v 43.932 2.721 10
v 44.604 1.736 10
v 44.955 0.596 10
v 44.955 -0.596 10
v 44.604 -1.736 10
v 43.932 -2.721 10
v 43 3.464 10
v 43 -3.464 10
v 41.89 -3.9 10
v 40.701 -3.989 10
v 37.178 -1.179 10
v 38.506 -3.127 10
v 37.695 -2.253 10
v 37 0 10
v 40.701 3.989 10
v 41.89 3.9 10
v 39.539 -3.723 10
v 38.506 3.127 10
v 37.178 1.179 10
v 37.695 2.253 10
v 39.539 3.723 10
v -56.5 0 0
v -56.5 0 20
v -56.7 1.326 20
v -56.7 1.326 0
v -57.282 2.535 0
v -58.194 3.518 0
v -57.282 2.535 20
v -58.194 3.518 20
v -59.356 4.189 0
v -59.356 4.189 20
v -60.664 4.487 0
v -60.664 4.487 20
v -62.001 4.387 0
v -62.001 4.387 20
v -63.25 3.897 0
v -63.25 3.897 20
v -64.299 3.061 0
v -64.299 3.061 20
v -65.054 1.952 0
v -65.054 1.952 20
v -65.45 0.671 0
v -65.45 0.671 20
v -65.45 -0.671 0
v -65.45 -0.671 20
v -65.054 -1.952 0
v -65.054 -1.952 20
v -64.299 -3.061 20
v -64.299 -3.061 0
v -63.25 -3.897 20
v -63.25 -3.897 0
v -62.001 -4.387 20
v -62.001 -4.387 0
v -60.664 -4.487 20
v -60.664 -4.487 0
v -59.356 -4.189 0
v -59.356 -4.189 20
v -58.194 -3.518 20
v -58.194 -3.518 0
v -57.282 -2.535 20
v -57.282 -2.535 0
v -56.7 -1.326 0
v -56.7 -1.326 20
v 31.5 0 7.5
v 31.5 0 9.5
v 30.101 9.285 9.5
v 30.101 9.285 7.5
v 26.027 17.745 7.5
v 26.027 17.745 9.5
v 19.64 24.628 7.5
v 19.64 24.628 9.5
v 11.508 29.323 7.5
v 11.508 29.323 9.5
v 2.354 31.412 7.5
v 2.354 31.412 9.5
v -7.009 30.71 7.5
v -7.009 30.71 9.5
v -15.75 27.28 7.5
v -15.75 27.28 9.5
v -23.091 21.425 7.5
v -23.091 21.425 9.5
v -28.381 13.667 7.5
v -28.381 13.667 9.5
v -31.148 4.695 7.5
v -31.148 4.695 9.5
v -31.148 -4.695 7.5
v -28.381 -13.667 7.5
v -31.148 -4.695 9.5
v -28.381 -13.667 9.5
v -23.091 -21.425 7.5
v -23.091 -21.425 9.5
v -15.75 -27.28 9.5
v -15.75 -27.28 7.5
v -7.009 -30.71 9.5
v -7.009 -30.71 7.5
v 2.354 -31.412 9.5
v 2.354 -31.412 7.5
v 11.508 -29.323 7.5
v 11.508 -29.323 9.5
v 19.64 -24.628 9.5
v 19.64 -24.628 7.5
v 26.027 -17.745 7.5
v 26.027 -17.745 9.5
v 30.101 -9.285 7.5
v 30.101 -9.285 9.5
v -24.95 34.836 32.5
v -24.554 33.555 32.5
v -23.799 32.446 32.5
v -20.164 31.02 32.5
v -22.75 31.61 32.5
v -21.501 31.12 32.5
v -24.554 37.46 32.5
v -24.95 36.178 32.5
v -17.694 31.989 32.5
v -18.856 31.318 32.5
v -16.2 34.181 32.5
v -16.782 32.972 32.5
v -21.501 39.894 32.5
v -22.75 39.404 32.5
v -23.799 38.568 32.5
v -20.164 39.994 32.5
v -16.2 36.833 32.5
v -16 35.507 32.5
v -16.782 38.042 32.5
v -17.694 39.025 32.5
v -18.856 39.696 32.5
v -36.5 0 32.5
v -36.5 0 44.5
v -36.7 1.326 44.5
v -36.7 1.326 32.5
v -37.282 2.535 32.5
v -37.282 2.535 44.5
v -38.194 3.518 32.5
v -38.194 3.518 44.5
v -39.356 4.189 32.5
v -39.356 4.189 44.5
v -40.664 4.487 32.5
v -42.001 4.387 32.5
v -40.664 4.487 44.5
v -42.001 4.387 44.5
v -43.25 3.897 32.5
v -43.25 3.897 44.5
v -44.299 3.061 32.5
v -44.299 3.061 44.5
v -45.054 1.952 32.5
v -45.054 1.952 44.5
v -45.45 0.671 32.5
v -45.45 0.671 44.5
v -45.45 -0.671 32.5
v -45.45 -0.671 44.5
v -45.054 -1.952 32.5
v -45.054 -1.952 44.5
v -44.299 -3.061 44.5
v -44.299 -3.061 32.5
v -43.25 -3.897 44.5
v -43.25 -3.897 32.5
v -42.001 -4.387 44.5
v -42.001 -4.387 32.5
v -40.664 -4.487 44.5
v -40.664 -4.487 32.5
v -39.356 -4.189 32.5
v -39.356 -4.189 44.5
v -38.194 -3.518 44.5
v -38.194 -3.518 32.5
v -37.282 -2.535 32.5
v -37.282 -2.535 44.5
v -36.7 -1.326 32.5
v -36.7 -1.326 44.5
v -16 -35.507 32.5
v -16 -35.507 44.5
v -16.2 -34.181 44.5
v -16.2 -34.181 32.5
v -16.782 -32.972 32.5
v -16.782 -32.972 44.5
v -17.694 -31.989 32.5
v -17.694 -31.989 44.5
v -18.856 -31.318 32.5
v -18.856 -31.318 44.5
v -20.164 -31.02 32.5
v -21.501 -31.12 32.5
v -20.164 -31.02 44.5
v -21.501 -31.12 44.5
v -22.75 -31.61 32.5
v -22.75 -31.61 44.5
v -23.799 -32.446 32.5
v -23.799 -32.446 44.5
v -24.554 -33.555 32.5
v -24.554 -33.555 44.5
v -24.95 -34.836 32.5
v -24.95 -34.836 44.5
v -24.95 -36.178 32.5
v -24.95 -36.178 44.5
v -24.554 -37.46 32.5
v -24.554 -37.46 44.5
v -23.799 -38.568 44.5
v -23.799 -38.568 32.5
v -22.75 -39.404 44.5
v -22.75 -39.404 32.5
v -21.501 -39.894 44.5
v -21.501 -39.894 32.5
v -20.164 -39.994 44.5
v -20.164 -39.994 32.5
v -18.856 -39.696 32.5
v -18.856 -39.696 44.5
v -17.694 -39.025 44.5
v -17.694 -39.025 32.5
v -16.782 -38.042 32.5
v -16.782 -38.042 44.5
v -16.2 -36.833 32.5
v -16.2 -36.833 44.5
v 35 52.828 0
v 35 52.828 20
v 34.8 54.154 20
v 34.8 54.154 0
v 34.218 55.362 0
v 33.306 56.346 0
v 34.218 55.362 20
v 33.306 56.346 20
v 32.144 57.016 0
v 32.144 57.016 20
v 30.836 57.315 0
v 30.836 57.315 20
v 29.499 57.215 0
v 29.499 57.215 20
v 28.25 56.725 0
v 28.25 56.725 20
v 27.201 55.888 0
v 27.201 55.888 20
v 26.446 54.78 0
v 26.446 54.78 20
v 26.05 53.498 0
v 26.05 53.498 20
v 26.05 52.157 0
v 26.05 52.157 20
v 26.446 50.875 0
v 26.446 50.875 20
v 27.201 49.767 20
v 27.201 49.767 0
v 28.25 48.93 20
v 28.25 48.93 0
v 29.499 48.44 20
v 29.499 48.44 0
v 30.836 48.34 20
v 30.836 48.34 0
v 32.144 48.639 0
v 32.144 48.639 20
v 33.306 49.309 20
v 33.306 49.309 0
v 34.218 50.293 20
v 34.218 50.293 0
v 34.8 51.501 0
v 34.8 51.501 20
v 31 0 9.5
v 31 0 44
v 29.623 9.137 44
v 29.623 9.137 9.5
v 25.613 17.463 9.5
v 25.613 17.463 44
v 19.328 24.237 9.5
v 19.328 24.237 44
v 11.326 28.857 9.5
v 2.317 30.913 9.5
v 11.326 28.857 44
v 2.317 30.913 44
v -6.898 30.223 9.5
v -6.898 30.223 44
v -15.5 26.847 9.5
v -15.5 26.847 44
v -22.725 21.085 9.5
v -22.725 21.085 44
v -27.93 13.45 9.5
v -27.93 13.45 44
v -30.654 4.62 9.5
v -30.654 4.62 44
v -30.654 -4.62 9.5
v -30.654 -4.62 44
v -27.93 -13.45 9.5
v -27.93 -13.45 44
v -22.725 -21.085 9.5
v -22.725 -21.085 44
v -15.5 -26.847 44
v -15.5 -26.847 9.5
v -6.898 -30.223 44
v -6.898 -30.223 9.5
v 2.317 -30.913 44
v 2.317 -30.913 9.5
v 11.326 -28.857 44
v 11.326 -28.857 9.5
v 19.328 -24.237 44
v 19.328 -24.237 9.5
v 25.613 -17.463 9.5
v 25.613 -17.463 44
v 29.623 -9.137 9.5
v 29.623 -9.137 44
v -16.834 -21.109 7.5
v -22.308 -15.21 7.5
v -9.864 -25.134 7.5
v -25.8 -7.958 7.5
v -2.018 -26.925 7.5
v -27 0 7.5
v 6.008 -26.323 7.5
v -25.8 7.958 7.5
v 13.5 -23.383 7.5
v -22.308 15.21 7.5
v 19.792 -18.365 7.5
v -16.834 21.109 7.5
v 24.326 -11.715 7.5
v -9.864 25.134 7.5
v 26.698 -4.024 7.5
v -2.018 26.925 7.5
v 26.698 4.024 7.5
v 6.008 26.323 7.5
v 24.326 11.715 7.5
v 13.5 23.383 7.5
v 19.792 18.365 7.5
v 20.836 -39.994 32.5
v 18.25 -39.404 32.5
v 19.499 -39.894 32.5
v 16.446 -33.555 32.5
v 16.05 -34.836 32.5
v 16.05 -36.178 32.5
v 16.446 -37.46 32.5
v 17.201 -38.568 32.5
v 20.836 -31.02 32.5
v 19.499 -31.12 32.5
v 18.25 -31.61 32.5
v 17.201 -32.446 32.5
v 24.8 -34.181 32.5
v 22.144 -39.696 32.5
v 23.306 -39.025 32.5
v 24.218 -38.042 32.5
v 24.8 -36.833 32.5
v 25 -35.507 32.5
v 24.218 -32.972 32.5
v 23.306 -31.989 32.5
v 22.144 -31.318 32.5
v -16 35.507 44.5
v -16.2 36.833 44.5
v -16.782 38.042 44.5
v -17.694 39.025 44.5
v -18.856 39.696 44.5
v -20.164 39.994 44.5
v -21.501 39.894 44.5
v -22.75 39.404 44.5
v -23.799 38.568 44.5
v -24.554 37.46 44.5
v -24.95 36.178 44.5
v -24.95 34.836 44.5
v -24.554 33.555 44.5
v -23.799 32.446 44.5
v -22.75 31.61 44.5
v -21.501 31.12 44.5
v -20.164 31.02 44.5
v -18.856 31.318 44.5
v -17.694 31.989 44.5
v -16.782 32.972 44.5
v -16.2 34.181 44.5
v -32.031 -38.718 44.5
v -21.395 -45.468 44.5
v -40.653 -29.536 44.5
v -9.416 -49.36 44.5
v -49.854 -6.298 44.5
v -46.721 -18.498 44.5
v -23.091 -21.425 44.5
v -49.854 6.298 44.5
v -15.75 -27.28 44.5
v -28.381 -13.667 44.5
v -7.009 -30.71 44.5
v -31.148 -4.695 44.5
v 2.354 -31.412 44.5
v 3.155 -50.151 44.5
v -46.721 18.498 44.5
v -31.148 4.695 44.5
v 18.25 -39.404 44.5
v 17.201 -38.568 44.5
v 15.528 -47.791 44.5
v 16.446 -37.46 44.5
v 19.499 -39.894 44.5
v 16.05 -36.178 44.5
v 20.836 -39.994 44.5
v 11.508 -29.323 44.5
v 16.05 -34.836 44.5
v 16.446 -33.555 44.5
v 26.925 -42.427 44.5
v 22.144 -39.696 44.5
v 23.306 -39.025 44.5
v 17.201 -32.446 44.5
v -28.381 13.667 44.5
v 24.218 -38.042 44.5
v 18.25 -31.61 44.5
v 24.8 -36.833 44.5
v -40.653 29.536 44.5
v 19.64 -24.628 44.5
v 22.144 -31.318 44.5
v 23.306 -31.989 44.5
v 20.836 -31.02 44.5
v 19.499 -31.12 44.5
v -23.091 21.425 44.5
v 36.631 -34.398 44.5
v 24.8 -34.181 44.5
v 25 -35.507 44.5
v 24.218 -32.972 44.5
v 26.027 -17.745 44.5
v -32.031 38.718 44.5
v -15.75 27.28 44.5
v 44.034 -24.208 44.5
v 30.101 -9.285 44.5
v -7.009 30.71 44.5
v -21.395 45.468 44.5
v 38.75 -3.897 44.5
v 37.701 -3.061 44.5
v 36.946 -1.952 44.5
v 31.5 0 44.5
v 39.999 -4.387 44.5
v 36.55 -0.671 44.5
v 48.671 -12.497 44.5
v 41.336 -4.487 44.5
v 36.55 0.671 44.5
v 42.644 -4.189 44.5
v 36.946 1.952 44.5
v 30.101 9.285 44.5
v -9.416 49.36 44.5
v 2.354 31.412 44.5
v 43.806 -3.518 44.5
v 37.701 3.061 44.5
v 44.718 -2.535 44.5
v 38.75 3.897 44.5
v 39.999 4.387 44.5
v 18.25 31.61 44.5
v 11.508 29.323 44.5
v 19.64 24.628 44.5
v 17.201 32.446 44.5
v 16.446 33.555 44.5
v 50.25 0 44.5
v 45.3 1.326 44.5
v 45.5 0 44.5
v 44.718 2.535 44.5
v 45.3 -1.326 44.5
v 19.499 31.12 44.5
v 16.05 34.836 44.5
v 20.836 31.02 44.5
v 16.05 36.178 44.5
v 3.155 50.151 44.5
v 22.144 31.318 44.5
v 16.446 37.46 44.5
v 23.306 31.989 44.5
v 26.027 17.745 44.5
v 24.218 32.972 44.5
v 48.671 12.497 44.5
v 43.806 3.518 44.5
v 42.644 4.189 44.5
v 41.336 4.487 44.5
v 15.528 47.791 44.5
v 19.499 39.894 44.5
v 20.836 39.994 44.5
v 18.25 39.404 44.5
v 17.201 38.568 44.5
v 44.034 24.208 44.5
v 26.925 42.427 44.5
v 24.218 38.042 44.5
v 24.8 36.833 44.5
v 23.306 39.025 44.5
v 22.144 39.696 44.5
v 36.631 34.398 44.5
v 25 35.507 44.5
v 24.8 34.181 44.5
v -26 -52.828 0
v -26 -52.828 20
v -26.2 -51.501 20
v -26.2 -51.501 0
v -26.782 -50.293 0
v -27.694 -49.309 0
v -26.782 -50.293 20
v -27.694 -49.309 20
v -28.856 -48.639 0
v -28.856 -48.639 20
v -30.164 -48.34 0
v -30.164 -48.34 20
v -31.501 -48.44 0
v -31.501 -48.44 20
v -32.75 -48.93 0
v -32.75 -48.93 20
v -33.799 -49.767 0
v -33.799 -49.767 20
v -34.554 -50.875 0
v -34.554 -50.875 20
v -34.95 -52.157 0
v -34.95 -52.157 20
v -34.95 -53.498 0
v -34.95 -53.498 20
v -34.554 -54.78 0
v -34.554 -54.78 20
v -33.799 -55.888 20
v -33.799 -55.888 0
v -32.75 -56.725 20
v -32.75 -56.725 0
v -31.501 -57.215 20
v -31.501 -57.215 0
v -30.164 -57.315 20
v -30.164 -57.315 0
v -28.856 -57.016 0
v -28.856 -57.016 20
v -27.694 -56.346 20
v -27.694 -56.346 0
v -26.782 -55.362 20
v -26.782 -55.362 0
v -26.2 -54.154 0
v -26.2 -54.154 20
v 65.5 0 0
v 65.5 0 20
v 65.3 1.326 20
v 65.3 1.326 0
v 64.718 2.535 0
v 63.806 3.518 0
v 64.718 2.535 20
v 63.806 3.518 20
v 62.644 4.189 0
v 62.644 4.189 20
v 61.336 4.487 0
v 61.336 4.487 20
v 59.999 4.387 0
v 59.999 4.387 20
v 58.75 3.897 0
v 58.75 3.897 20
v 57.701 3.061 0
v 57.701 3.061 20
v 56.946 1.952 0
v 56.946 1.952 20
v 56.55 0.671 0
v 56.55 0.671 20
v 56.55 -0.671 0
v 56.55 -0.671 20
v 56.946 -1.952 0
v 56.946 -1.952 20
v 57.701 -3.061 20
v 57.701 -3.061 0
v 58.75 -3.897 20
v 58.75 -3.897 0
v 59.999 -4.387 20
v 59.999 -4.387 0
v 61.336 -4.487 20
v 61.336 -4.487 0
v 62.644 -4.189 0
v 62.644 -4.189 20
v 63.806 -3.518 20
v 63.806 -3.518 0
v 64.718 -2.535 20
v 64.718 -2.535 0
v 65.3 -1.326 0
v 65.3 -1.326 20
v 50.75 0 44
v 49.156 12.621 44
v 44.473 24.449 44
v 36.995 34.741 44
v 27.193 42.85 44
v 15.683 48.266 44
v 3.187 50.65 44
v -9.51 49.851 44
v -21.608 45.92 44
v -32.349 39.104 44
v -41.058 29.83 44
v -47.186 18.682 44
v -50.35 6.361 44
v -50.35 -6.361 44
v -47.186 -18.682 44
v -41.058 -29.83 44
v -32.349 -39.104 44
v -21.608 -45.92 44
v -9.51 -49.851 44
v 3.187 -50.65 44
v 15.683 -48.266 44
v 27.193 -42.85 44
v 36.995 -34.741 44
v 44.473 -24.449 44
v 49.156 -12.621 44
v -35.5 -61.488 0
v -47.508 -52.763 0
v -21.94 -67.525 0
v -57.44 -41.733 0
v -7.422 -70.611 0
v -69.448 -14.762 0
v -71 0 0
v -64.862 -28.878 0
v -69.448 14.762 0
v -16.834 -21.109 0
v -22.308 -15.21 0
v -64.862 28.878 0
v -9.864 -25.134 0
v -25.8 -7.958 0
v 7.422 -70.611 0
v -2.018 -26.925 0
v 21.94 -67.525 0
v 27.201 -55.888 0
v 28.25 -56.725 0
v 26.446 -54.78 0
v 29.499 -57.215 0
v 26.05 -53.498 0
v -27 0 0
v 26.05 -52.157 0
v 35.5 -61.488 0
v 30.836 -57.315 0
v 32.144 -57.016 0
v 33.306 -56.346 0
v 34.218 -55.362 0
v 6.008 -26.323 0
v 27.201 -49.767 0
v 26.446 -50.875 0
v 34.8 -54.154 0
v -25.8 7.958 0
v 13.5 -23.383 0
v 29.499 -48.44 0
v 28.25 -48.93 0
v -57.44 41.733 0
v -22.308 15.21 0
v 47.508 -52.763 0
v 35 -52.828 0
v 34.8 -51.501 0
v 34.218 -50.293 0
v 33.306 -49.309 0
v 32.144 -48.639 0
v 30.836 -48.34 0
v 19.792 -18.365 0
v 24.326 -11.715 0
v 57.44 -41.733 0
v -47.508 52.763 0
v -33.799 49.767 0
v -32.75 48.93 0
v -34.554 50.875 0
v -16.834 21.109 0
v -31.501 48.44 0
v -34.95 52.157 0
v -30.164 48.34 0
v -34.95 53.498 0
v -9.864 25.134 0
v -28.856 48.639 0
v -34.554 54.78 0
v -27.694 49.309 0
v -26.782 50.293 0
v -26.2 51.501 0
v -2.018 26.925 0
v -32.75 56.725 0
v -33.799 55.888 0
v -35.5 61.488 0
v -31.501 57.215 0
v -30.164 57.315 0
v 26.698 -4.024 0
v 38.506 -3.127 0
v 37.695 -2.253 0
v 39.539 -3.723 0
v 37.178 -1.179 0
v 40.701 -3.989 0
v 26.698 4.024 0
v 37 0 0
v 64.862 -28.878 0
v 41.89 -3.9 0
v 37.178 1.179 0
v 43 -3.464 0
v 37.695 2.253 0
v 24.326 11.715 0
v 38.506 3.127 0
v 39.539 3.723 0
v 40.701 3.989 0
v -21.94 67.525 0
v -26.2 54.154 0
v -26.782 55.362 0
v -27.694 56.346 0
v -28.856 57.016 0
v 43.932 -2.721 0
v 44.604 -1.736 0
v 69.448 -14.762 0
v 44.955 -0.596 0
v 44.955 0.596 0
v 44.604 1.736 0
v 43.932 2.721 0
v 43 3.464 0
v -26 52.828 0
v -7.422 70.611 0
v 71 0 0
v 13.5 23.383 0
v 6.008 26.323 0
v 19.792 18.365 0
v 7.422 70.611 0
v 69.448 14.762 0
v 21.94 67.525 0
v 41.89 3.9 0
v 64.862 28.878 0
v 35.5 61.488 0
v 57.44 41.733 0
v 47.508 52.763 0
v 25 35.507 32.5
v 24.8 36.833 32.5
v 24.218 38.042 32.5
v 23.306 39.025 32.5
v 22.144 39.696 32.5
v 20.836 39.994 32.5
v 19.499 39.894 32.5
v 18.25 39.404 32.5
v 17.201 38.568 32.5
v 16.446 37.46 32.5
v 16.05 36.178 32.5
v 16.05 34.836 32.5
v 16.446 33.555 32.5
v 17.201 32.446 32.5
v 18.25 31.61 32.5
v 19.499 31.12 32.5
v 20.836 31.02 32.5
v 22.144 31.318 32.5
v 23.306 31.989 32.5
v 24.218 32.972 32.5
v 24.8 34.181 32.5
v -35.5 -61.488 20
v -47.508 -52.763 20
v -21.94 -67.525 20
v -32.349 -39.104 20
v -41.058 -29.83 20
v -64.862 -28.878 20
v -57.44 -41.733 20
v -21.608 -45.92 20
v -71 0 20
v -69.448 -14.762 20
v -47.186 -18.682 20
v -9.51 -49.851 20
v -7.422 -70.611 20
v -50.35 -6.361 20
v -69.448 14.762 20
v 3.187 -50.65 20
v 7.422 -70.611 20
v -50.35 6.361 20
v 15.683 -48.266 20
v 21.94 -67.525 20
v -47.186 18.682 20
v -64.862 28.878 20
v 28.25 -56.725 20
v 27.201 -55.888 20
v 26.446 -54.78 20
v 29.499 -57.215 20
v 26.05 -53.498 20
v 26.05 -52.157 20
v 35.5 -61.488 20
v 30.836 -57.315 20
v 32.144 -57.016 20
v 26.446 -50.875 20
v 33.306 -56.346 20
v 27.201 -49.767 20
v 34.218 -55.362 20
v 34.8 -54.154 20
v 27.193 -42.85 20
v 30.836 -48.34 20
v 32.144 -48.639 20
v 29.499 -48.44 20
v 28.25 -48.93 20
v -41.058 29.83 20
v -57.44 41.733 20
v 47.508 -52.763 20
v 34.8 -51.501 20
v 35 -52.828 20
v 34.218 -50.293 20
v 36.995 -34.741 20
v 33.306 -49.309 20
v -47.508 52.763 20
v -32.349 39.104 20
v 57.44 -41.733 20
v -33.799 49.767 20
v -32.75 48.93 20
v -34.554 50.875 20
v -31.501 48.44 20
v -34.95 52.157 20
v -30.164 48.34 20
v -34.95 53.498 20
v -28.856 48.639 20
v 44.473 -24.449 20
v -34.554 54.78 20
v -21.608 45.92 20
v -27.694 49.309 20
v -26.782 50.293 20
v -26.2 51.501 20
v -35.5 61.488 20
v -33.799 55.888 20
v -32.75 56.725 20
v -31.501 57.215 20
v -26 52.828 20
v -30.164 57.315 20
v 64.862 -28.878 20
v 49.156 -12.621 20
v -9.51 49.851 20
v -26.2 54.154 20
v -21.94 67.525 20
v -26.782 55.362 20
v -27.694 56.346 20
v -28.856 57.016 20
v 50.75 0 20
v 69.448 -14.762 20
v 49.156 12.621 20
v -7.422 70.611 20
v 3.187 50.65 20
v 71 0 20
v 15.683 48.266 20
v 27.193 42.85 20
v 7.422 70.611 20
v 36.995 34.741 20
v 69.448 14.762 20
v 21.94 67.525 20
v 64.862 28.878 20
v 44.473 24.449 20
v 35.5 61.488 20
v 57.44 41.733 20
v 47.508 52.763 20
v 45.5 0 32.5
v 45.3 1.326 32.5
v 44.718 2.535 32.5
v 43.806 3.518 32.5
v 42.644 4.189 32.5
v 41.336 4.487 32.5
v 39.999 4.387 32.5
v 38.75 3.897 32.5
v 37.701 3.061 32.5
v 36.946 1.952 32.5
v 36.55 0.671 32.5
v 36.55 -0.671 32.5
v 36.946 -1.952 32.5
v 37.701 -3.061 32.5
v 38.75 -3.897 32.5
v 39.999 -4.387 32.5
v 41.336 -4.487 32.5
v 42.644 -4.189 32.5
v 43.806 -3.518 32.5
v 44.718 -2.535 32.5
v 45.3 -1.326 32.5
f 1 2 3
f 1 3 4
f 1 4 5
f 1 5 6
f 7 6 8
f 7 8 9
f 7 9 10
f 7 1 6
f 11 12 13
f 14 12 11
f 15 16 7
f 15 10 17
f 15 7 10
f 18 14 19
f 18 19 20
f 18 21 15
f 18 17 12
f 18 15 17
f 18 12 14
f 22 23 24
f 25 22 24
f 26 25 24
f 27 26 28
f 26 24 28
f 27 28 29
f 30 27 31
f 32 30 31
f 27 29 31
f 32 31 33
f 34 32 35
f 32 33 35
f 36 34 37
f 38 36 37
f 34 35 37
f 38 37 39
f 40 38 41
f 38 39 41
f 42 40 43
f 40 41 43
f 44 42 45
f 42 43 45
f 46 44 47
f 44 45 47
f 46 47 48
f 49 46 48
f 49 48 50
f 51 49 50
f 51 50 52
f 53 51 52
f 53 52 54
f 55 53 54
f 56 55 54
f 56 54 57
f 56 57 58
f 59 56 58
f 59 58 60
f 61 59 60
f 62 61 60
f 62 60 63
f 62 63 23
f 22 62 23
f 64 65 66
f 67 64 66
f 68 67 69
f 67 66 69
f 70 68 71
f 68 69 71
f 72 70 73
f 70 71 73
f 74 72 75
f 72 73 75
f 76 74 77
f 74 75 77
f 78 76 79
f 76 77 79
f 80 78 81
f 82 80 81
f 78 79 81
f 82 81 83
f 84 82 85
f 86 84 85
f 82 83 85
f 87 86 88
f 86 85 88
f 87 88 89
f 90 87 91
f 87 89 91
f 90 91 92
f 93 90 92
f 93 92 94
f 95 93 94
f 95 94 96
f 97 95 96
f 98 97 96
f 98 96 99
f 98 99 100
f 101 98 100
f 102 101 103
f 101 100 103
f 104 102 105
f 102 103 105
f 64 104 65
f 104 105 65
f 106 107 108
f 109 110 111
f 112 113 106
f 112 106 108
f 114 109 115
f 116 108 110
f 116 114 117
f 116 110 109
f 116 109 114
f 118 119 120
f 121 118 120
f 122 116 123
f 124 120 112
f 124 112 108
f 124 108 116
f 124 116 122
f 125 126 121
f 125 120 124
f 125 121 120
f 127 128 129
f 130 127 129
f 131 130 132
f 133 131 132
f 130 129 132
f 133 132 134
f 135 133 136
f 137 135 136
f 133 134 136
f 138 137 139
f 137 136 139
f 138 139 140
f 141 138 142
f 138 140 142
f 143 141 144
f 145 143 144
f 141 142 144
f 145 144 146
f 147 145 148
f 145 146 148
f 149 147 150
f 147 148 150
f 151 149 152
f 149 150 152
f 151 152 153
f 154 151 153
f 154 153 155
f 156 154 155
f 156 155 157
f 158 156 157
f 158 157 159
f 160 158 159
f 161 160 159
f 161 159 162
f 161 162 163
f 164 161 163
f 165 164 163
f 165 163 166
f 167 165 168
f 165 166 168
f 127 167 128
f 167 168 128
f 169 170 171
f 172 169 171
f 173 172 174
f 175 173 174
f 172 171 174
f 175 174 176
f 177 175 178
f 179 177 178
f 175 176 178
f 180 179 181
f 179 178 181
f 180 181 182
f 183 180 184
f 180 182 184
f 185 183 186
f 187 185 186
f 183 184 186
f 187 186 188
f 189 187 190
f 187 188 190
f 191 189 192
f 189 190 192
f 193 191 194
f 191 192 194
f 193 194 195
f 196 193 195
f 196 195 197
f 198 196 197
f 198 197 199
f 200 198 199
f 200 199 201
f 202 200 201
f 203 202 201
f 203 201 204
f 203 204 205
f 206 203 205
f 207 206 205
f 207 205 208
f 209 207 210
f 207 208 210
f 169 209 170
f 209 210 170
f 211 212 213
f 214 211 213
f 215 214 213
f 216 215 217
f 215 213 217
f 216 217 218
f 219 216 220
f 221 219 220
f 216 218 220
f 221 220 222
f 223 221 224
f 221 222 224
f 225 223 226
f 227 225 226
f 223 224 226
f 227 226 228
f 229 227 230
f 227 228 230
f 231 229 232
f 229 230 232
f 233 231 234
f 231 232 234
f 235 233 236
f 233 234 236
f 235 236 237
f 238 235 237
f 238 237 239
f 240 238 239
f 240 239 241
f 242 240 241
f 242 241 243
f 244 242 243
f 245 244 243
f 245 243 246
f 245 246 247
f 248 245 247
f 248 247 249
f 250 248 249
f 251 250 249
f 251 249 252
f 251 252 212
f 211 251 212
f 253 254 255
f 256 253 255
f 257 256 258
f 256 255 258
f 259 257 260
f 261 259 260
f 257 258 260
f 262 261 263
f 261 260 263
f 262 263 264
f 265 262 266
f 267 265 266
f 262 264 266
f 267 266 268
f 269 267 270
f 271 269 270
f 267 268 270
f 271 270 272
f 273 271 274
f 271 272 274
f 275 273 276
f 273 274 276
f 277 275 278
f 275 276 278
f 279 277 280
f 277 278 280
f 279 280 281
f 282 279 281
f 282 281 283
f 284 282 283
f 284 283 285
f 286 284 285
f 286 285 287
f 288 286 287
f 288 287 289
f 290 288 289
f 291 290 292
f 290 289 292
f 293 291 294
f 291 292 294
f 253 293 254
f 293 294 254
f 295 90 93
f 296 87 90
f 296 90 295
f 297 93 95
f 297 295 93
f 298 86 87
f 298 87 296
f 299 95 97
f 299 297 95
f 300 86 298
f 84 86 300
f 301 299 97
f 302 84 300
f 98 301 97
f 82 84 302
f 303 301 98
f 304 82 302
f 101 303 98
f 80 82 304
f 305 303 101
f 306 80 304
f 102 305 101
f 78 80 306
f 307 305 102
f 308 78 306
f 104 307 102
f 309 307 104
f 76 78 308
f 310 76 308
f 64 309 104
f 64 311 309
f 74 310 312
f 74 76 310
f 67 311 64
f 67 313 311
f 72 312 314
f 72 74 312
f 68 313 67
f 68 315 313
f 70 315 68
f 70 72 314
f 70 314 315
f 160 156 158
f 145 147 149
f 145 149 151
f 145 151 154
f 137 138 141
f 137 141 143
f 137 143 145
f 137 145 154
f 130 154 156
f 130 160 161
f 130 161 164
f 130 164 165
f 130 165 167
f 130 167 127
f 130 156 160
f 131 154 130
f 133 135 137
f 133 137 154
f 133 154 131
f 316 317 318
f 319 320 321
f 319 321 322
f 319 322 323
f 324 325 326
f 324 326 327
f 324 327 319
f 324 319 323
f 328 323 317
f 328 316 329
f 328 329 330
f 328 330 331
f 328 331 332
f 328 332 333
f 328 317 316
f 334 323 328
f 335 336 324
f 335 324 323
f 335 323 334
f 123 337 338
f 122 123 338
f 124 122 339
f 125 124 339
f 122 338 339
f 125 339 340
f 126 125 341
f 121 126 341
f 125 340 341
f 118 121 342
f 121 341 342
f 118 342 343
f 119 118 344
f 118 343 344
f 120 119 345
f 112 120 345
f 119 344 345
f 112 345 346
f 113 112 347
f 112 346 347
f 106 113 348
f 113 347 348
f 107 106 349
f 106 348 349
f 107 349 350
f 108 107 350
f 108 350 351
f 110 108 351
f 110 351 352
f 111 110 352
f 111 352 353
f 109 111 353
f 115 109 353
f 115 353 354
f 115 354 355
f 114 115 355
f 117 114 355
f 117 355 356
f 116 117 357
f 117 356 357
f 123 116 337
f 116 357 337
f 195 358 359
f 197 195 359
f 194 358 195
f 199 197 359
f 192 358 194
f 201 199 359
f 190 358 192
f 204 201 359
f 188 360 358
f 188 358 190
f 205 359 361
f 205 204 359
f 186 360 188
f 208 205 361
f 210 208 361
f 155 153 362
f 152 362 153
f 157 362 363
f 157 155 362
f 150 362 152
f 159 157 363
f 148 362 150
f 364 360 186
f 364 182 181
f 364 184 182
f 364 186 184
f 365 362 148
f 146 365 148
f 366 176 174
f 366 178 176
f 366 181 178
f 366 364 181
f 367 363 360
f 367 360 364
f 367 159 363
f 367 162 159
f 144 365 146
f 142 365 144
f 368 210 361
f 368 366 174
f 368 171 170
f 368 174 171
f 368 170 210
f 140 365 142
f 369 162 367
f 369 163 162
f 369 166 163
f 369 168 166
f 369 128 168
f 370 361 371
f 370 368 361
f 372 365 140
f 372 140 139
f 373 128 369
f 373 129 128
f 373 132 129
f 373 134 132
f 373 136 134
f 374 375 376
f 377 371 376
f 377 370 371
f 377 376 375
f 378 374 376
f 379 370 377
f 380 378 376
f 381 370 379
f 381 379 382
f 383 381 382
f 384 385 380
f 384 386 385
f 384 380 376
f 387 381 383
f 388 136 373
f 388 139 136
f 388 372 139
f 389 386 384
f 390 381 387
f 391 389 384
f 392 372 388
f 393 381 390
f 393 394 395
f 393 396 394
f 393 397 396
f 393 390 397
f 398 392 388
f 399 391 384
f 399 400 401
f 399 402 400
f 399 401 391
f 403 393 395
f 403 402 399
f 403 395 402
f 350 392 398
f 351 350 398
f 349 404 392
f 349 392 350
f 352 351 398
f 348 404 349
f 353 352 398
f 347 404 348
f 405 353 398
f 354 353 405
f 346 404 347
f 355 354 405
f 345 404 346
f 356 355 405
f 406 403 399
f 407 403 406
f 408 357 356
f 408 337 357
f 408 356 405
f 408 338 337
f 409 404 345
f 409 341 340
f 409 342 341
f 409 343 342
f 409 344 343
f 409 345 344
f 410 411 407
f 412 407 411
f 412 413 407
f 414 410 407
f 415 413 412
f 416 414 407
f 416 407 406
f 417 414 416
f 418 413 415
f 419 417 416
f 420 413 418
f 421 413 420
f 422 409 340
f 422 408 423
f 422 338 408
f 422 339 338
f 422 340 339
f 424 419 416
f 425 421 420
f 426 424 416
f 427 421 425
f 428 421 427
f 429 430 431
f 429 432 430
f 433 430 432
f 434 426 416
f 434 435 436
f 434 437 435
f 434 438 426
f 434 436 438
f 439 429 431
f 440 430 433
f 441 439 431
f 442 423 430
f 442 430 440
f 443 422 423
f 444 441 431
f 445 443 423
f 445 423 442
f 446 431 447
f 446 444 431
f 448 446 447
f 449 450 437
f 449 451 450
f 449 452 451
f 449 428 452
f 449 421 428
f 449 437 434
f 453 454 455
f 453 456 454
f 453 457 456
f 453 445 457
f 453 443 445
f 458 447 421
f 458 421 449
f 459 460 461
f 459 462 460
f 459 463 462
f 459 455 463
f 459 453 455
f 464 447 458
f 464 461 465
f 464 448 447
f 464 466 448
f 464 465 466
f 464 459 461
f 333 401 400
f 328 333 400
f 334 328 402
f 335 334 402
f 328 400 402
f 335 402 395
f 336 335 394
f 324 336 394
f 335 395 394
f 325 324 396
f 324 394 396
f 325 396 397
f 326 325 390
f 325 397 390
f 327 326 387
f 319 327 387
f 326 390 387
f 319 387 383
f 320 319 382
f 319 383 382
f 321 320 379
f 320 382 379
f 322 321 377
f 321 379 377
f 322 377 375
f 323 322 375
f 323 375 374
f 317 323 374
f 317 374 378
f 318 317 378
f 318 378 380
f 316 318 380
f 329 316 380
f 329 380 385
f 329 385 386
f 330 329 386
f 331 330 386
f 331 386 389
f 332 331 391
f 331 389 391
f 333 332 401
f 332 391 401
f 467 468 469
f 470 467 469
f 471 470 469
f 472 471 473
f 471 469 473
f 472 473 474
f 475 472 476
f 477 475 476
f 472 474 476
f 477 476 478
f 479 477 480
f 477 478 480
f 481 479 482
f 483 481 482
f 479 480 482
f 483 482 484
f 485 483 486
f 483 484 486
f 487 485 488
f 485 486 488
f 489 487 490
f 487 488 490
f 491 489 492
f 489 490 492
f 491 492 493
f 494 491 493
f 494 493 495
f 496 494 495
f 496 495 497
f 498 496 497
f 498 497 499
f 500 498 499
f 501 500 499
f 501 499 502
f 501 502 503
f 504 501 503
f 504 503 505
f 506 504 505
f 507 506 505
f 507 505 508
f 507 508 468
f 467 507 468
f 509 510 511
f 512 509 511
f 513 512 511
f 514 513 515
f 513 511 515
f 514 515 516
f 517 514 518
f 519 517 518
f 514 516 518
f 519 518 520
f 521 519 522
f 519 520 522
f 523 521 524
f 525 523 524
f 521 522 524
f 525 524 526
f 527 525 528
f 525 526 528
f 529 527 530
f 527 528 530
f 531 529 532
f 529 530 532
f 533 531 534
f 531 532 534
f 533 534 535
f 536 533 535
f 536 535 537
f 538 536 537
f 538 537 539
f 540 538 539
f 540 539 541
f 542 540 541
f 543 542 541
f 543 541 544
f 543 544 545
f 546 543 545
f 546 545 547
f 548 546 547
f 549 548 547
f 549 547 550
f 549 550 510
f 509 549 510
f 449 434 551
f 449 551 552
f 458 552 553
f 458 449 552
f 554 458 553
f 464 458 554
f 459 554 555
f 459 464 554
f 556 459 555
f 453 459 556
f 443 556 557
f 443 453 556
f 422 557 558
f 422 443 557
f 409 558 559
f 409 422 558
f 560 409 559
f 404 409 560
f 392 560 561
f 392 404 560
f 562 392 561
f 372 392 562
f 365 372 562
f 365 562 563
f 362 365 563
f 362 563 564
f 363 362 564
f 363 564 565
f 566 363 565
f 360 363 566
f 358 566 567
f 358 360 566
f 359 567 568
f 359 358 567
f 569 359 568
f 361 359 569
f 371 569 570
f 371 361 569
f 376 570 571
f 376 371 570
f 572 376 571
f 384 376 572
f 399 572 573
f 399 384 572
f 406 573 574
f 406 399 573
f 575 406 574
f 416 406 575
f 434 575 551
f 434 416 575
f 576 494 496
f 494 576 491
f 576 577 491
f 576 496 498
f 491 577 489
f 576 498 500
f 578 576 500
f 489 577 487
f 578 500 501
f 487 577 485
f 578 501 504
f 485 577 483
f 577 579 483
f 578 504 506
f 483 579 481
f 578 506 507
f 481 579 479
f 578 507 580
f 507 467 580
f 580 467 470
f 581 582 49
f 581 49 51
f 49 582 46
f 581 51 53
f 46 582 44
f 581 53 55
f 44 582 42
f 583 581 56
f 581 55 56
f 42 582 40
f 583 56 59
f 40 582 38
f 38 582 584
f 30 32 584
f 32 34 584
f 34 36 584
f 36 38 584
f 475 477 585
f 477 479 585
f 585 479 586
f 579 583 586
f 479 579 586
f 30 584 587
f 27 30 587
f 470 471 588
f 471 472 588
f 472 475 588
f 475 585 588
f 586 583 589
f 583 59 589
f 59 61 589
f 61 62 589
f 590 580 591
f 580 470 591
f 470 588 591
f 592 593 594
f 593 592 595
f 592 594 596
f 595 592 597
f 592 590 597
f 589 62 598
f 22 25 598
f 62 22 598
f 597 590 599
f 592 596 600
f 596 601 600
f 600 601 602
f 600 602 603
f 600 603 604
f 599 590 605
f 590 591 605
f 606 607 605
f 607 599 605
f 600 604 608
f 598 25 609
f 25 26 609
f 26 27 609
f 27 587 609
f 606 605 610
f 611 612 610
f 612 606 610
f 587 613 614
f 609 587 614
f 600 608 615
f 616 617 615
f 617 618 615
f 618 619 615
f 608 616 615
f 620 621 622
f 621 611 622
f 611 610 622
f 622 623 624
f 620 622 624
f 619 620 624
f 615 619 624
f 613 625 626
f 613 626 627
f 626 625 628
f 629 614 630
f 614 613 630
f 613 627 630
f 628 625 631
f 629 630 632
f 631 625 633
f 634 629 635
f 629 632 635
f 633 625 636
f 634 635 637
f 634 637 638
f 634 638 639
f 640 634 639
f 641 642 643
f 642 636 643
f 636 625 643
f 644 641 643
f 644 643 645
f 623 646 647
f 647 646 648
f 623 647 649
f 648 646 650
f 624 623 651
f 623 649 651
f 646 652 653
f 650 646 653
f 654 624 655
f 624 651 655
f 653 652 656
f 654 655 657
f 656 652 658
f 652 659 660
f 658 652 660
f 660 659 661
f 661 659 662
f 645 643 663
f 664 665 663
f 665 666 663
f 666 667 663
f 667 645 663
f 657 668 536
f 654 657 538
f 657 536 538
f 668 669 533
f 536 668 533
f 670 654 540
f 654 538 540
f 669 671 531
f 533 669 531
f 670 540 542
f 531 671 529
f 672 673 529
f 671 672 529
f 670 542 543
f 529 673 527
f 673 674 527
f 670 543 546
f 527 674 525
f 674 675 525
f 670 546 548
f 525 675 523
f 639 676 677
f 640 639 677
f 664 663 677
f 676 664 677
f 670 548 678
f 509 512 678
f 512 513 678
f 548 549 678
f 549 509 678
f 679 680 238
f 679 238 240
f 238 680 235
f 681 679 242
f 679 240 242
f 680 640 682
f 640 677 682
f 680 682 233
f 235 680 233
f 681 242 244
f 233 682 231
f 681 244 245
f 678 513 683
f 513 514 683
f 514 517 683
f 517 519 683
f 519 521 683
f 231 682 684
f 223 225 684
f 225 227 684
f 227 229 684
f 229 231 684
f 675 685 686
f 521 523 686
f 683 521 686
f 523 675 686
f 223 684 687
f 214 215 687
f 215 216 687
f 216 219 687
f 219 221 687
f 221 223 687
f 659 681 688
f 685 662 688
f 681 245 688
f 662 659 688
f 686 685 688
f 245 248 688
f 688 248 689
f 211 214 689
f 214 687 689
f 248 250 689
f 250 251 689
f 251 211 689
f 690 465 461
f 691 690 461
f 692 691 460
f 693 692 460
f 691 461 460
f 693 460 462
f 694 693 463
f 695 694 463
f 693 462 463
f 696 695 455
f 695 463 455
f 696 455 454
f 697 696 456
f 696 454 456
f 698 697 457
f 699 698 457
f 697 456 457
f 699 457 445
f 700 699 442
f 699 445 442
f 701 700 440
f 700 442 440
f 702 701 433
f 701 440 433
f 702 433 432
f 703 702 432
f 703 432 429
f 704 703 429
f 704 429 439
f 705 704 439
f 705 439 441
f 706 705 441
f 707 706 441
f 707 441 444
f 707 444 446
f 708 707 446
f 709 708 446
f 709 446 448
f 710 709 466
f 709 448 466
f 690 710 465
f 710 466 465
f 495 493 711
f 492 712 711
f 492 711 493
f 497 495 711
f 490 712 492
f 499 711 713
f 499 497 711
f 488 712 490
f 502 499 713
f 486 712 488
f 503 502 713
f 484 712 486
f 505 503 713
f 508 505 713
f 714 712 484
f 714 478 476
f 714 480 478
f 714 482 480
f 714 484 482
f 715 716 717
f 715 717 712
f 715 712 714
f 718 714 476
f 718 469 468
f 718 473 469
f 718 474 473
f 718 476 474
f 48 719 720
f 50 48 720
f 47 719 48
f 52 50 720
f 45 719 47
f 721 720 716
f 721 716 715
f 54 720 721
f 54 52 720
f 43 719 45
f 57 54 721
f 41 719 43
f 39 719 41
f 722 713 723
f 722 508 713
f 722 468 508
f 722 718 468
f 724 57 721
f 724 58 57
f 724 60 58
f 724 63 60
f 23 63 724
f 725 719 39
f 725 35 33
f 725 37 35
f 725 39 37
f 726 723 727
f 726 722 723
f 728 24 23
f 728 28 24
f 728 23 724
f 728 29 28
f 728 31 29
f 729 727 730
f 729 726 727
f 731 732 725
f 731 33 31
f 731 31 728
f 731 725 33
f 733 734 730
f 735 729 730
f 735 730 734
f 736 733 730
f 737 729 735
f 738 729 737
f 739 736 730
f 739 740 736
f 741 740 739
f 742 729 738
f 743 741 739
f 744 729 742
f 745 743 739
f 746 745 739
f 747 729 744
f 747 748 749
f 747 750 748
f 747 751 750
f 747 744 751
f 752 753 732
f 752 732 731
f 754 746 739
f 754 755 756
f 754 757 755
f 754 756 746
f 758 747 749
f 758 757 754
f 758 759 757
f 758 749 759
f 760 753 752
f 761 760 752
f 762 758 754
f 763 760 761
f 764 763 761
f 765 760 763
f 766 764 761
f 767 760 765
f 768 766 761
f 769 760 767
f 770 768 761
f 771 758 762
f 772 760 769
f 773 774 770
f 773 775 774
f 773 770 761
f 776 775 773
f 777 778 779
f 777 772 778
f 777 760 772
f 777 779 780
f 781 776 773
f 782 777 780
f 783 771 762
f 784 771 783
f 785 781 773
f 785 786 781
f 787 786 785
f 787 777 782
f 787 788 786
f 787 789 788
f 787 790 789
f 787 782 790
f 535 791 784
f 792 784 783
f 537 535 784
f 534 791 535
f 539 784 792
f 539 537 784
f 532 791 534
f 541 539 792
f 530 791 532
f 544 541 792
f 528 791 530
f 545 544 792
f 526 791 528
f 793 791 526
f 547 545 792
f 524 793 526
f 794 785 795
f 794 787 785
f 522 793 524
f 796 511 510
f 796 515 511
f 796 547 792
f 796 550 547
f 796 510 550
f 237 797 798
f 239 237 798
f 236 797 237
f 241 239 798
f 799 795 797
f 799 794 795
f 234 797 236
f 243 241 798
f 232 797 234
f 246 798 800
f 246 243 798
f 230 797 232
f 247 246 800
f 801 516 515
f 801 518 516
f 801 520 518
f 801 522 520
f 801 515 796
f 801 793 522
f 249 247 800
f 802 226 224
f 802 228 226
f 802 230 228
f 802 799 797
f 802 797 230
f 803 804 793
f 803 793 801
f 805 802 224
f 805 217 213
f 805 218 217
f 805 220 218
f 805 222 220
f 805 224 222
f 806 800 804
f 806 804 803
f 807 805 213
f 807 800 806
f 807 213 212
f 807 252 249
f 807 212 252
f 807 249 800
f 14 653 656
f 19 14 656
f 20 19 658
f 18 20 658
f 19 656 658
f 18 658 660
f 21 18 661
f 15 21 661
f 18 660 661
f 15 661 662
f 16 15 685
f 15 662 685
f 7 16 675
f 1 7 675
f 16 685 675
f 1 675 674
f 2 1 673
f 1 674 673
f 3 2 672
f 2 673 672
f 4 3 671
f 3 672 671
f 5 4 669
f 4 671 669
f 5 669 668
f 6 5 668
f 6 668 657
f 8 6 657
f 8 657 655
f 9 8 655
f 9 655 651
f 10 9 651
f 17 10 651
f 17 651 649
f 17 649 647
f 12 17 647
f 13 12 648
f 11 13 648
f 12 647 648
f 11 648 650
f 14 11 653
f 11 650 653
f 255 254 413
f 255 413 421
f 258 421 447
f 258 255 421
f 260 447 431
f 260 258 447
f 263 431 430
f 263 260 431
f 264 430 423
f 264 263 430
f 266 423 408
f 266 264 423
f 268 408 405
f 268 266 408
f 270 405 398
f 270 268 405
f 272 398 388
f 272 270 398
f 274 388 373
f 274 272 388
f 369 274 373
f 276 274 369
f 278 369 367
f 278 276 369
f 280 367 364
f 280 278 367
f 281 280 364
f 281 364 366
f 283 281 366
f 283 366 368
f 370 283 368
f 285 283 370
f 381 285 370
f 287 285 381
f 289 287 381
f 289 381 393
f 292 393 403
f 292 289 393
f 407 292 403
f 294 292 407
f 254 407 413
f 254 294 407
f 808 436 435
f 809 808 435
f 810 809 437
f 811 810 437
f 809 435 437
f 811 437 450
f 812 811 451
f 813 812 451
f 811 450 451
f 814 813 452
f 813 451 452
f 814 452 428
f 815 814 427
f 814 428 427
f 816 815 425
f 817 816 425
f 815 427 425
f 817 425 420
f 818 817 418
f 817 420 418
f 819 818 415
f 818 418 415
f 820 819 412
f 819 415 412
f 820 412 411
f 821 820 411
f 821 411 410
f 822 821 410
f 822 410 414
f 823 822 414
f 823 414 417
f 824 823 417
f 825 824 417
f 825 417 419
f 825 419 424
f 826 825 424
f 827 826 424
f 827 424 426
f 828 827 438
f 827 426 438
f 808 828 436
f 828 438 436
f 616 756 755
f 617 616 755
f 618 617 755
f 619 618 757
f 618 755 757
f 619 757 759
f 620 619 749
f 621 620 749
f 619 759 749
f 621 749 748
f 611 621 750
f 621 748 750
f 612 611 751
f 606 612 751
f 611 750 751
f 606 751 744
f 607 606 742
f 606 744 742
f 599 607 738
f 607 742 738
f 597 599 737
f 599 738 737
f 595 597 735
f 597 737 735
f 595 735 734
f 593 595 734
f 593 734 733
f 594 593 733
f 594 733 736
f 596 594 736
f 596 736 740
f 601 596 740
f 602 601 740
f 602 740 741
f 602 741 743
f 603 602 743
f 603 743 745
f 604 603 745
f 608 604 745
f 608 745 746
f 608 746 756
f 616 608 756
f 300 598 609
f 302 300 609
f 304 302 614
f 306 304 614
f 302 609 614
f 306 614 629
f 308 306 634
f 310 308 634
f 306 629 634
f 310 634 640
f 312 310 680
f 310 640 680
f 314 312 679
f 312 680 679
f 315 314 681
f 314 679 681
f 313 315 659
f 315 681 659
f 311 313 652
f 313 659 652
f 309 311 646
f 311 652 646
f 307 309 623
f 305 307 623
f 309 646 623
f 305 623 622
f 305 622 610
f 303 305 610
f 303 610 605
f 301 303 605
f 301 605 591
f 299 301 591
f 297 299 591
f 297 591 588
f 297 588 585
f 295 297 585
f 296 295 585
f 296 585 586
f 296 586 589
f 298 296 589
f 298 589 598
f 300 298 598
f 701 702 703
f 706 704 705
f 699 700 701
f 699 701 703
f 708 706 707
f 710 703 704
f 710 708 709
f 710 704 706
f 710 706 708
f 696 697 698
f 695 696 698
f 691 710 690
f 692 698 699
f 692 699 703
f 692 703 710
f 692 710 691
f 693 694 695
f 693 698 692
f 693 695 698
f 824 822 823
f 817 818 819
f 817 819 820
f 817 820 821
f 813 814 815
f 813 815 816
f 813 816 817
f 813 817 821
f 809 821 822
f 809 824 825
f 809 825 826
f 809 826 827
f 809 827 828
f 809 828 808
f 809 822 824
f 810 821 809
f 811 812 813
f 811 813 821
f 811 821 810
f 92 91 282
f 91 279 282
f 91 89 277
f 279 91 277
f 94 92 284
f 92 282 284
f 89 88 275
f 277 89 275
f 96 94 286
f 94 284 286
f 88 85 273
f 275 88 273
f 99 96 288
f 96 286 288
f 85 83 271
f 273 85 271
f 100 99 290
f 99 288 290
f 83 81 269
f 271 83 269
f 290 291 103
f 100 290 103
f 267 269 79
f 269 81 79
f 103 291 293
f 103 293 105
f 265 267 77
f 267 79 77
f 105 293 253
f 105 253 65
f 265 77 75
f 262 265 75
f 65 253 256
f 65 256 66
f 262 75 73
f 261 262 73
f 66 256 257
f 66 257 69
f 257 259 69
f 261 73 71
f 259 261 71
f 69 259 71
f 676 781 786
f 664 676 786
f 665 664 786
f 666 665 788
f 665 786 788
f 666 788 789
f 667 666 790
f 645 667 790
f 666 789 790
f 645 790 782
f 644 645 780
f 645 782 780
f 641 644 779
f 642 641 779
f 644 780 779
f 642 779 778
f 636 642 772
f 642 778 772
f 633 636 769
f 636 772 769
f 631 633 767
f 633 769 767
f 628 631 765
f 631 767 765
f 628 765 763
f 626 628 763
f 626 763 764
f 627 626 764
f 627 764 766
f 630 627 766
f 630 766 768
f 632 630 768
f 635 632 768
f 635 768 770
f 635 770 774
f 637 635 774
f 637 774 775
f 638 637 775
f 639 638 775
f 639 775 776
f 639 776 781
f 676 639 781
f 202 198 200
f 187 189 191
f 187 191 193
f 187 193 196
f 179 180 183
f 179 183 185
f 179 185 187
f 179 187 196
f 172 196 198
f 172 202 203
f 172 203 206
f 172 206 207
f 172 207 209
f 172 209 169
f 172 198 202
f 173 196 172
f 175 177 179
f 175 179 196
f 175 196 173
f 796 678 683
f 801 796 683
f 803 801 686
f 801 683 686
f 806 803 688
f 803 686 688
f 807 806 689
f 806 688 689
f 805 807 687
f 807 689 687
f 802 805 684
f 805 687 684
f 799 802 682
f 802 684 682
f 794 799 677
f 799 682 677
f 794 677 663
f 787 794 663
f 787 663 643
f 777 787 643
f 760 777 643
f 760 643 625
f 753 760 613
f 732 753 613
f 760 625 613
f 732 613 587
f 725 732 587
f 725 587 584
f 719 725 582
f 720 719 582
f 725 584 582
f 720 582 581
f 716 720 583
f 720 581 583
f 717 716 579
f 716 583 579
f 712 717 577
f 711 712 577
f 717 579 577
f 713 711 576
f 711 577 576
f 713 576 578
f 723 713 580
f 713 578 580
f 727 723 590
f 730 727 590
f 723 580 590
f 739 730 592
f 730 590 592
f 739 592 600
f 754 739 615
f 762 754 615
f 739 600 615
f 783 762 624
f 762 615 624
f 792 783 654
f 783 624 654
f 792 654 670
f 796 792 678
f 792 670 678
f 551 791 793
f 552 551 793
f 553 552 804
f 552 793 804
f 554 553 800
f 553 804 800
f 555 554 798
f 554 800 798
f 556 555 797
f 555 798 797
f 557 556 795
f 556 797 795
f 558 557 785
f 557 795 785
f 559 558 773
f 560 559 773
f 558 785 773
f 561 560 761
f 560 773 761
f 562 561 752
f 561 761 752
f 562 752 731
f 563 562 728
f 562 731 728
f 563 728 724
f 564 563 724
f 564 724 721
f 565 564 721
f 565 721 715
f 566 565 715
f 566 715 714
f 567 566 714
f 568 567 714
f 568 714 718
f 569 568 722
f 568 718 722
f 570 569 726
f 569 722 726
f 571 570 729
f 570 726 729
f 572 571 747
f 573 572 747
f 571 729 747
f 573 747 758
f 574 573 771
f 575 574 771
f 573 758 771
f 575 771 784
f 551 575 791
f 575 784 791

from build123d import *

# Parameters (mm, degrees)
SKETCH_1_R          = 71
EXTRUDE_1_DEPTH     = 20
SKETCH_2_R          = 50.75
EXTRUDE_2_DEPTH     = 24.5
SKETCH_4_R          = 31
CUT_EXTRUDE_1_DEPTH = 35
CHAMFER_1_SIZE      = 0.5
SKETCH_5_R          = 27
CUT_EXTRUDE_2_DEPTH = 8
SKETCH_6_R          = 31.5
CUT_EXTRUDE_3_DEPTH = 2
CUT_EXTRUDE_4_REACH = 105.355
SKETCH_7_R          = 4.5
SKETCH_8_R          = 4
CUT_EXTRUDE_5_DEPTH = 10
SKETCH_9_R          = 4.5
CUT_EXTRUDE_6_DEPTH = 12


with BuildPart() as part:
    # 草图1 → 凸台-拉伸1 (new body)
    with BuildSketch(Plane.XY):
        Circle(SKETCH_1_R)
    extrude(amount=EXTRUDE_1_DEPTH)

    # 草图2 → 凸台-拉伸2 (add)
    with BuildSketch(Plane.XY.offset(20)):
        Circle(SKETCH_2_R)
    extrude(amount=EXTRUDE_2_DEPTH)

    # 草图4 → 切除-拉伸1 (cut)
    with BuildSketch(Plane.XY.offset(44.5)):
        Circle(SKETCH_4_R)
    extrude(amount=-CUT_EXTRUDE_1_DEPTH, mode=Mode.SUBTRACT)

    # 倒角1
    chamfer_1_edges = [part.edges().sort_by_distance(p)[0] for p in [
        (-31, 0, 44.5),
        (-50.75, 0, 44.5),
    ]]
    chamfer(chamfer_1_edges, length=CHAMFER_1_SIZE)

    # 草图5 → 切除-拉伸2 (cut)
    with BuildSketch(Plane(origin=(0, 0, 0), x_dir=(-1, 0, 0), z_dir=(0, 0, -1))):
        Circle(SKETCH_5_R)
    extrude(amount=-CUT_EXTRUDE_2_DEPTH, mode=Mode.SUBTRACT)

    # 草图6 → 切除-拉伸3 (cut)
    with BuildSketch(Plane.XY.offset(9.5)):
        Circle(SKETCH_6_R)
    extrude(amount=-CUT_EXTRUDE_3_DEPTH, mode=Mode.SUBTRACT)

    # 草图7 → 切除-拉伸4 (cut, up to next)
    with BuildSketch(Plane.XY.offset(20), mode=Mode.PRIVATE) as cut_extrude_4_sk1:
        with Locations((-61, 0)):
            Circle(SKETCH_7_R)
    cut_extrude_4_tool1 = extrude(cut_extrude_4_sk1.sketch, amount=-CUT_EXTRUDE_4_REACH, mode=Mode.PRIVATE) & part.part
    # 草图7 → 切除-拉伸4 (cut, up to next)
    with BuildSketch(Plane.XY.offset(20), mode=Mode.PRIVATE) as cut_extrude_4_sk2:
        with Locations((-30.5, 52.827549631)):
            Circle(SKETCH_7_R)
    cut_extrude_4_tool2 = extrude(cut_extrude_4_sk2.sketch, amount=-CUT_EXTRUDE_4_REACH, mode=Mode.PRIVATE) & part.part
    # 草图7 → 切除-拉伸4 (cut, up to next)
    with BuildSketch(Plane.XY.offset(20), mode=Mode.PRIVATE) as cut_extrude_4_sk3:
        with Locations((30.5, 52.827549631)):
            Circle(SKETCH_7_R)
    cut_extrude_4_tool3 = extrude(cut_extrude_4_sk3.sketch, amount=-CUT_EXTRUDE_4_REACH, mode=Mode.PRIVATE) & part.part
    # 草图7 → 切除-拉伸4 (cut, up to next)
    with BuildSketch(Plane.XY.offset(20), mode=Mode.PRIVATE) as cut_extrude_4_sk4:
        with Locations((61, 0)):
            Circle(SKETCH_7_R)
    cut_extrude_4_tool4 = extrude(cut_extrude_4_sk4.sketch, amount=-CUT_EXTRUDE_4_REACH, mode=Mode.PRIVATE) & part.part
    # 草图7 → 切除-拉伸4 (cut, up to next)
    with BuildSketch(Plane.XY.offset(20), mode=Mode.PRIVATE) as cut_extrude_4_sk5:
        with Locations((30.5, -52.827549631)):
            Circle(SKETCH_7_R)
    cut_extrude_4_tool5 = extrude(cut_extrude_4_sk5.sketch, amount=-CUT_EXTRUDE_4_REACH, mode=Mode.PRIVATE) & part.part
    # 草图7 → 切除-拉伸4 (cut, up to next)
    with BuildSketch(Plane.XY.offset(20), mode=Mode.PRIVATE) as cut_extrude_4_sk6:
        with Locations((-30.5, -52.827549631)):
            Circle(SKETCH_7_R)
    cut_extrude_4_tool6 = extrude(cut_extrude_4_sk6.sketch, amount=-CUT_EXTRUDE_4_REACH, mode=Mode.PRIVATE) & part.part
    add(cut_extrude_4_tool1.solids().sort_by_distance((-61, 0, 20))[0], mode=Mode.SUBTRACT)
    add(cut_extrude_4_tool2.solids().sort_by_distance((-30.5, 52.82755, 20))[0], mode=Mode.SUBTRACT)
    add(cut_extrude_4_tool3.solids().sort_by_distance((30.5, 52.82755, 20))[0], mode=Mode.SUBTRACT)
    add(cut_extrude_4_tool4.solids().sort_by_distance((61, 0, 20))[0], mode=Mode.SUBTRACT)
    add(cut_extrude_4_tool5.solids().sort_by_distance((30.5, -52.82755, 20))[0], mode=Mode.SUBTRACT)
    add(cut_extrude_4_tool6.solids().sort_by_distance((-30.5, -52.82755, 20))[0], mode=Mode.SUBTRACT)

    # 草图8 → 切除-拉伸5 (cut)
    with BuildSketch(Plane(origin=(0, 0, 0), x_dir=(-1, 0, 0), z_dir=(0, 0, -1))):
        with Locations((-41, 0)):
            Circle(SKETCH_8_R)
    extrude(amount=-CUT_EXTRUDE_5_DEPTH, mode=Mode.SUBTRACT)

    # 草图9 → 切除-拉伸6 (cut)
    with BuildSketch(Plane.XY.offset(44.5)):
        with Locations((41, 0)):
            Circle(SKETCH_9_R)
        with Locations((20.5, -35.507041555)):
            Circle(SKETCH_9_R)
        with Locations((-20.5, -35.507041555)):
            Circle(SKETCH_9_R)
        with Locations((-41, 0)):
            Circle(SKETCH_9_R)
        with Locations((-20.5, 35.507041555)):
            Circle(SKETCH_9_R)
        with Locations((20.5, 35.507041555)):
            Circle(SKETCH_9_R)
    extrude(amount=-CUT_EXTRUDE_6_DEPTH, mode=Mode.SUBTRACT)


solid = part.part
